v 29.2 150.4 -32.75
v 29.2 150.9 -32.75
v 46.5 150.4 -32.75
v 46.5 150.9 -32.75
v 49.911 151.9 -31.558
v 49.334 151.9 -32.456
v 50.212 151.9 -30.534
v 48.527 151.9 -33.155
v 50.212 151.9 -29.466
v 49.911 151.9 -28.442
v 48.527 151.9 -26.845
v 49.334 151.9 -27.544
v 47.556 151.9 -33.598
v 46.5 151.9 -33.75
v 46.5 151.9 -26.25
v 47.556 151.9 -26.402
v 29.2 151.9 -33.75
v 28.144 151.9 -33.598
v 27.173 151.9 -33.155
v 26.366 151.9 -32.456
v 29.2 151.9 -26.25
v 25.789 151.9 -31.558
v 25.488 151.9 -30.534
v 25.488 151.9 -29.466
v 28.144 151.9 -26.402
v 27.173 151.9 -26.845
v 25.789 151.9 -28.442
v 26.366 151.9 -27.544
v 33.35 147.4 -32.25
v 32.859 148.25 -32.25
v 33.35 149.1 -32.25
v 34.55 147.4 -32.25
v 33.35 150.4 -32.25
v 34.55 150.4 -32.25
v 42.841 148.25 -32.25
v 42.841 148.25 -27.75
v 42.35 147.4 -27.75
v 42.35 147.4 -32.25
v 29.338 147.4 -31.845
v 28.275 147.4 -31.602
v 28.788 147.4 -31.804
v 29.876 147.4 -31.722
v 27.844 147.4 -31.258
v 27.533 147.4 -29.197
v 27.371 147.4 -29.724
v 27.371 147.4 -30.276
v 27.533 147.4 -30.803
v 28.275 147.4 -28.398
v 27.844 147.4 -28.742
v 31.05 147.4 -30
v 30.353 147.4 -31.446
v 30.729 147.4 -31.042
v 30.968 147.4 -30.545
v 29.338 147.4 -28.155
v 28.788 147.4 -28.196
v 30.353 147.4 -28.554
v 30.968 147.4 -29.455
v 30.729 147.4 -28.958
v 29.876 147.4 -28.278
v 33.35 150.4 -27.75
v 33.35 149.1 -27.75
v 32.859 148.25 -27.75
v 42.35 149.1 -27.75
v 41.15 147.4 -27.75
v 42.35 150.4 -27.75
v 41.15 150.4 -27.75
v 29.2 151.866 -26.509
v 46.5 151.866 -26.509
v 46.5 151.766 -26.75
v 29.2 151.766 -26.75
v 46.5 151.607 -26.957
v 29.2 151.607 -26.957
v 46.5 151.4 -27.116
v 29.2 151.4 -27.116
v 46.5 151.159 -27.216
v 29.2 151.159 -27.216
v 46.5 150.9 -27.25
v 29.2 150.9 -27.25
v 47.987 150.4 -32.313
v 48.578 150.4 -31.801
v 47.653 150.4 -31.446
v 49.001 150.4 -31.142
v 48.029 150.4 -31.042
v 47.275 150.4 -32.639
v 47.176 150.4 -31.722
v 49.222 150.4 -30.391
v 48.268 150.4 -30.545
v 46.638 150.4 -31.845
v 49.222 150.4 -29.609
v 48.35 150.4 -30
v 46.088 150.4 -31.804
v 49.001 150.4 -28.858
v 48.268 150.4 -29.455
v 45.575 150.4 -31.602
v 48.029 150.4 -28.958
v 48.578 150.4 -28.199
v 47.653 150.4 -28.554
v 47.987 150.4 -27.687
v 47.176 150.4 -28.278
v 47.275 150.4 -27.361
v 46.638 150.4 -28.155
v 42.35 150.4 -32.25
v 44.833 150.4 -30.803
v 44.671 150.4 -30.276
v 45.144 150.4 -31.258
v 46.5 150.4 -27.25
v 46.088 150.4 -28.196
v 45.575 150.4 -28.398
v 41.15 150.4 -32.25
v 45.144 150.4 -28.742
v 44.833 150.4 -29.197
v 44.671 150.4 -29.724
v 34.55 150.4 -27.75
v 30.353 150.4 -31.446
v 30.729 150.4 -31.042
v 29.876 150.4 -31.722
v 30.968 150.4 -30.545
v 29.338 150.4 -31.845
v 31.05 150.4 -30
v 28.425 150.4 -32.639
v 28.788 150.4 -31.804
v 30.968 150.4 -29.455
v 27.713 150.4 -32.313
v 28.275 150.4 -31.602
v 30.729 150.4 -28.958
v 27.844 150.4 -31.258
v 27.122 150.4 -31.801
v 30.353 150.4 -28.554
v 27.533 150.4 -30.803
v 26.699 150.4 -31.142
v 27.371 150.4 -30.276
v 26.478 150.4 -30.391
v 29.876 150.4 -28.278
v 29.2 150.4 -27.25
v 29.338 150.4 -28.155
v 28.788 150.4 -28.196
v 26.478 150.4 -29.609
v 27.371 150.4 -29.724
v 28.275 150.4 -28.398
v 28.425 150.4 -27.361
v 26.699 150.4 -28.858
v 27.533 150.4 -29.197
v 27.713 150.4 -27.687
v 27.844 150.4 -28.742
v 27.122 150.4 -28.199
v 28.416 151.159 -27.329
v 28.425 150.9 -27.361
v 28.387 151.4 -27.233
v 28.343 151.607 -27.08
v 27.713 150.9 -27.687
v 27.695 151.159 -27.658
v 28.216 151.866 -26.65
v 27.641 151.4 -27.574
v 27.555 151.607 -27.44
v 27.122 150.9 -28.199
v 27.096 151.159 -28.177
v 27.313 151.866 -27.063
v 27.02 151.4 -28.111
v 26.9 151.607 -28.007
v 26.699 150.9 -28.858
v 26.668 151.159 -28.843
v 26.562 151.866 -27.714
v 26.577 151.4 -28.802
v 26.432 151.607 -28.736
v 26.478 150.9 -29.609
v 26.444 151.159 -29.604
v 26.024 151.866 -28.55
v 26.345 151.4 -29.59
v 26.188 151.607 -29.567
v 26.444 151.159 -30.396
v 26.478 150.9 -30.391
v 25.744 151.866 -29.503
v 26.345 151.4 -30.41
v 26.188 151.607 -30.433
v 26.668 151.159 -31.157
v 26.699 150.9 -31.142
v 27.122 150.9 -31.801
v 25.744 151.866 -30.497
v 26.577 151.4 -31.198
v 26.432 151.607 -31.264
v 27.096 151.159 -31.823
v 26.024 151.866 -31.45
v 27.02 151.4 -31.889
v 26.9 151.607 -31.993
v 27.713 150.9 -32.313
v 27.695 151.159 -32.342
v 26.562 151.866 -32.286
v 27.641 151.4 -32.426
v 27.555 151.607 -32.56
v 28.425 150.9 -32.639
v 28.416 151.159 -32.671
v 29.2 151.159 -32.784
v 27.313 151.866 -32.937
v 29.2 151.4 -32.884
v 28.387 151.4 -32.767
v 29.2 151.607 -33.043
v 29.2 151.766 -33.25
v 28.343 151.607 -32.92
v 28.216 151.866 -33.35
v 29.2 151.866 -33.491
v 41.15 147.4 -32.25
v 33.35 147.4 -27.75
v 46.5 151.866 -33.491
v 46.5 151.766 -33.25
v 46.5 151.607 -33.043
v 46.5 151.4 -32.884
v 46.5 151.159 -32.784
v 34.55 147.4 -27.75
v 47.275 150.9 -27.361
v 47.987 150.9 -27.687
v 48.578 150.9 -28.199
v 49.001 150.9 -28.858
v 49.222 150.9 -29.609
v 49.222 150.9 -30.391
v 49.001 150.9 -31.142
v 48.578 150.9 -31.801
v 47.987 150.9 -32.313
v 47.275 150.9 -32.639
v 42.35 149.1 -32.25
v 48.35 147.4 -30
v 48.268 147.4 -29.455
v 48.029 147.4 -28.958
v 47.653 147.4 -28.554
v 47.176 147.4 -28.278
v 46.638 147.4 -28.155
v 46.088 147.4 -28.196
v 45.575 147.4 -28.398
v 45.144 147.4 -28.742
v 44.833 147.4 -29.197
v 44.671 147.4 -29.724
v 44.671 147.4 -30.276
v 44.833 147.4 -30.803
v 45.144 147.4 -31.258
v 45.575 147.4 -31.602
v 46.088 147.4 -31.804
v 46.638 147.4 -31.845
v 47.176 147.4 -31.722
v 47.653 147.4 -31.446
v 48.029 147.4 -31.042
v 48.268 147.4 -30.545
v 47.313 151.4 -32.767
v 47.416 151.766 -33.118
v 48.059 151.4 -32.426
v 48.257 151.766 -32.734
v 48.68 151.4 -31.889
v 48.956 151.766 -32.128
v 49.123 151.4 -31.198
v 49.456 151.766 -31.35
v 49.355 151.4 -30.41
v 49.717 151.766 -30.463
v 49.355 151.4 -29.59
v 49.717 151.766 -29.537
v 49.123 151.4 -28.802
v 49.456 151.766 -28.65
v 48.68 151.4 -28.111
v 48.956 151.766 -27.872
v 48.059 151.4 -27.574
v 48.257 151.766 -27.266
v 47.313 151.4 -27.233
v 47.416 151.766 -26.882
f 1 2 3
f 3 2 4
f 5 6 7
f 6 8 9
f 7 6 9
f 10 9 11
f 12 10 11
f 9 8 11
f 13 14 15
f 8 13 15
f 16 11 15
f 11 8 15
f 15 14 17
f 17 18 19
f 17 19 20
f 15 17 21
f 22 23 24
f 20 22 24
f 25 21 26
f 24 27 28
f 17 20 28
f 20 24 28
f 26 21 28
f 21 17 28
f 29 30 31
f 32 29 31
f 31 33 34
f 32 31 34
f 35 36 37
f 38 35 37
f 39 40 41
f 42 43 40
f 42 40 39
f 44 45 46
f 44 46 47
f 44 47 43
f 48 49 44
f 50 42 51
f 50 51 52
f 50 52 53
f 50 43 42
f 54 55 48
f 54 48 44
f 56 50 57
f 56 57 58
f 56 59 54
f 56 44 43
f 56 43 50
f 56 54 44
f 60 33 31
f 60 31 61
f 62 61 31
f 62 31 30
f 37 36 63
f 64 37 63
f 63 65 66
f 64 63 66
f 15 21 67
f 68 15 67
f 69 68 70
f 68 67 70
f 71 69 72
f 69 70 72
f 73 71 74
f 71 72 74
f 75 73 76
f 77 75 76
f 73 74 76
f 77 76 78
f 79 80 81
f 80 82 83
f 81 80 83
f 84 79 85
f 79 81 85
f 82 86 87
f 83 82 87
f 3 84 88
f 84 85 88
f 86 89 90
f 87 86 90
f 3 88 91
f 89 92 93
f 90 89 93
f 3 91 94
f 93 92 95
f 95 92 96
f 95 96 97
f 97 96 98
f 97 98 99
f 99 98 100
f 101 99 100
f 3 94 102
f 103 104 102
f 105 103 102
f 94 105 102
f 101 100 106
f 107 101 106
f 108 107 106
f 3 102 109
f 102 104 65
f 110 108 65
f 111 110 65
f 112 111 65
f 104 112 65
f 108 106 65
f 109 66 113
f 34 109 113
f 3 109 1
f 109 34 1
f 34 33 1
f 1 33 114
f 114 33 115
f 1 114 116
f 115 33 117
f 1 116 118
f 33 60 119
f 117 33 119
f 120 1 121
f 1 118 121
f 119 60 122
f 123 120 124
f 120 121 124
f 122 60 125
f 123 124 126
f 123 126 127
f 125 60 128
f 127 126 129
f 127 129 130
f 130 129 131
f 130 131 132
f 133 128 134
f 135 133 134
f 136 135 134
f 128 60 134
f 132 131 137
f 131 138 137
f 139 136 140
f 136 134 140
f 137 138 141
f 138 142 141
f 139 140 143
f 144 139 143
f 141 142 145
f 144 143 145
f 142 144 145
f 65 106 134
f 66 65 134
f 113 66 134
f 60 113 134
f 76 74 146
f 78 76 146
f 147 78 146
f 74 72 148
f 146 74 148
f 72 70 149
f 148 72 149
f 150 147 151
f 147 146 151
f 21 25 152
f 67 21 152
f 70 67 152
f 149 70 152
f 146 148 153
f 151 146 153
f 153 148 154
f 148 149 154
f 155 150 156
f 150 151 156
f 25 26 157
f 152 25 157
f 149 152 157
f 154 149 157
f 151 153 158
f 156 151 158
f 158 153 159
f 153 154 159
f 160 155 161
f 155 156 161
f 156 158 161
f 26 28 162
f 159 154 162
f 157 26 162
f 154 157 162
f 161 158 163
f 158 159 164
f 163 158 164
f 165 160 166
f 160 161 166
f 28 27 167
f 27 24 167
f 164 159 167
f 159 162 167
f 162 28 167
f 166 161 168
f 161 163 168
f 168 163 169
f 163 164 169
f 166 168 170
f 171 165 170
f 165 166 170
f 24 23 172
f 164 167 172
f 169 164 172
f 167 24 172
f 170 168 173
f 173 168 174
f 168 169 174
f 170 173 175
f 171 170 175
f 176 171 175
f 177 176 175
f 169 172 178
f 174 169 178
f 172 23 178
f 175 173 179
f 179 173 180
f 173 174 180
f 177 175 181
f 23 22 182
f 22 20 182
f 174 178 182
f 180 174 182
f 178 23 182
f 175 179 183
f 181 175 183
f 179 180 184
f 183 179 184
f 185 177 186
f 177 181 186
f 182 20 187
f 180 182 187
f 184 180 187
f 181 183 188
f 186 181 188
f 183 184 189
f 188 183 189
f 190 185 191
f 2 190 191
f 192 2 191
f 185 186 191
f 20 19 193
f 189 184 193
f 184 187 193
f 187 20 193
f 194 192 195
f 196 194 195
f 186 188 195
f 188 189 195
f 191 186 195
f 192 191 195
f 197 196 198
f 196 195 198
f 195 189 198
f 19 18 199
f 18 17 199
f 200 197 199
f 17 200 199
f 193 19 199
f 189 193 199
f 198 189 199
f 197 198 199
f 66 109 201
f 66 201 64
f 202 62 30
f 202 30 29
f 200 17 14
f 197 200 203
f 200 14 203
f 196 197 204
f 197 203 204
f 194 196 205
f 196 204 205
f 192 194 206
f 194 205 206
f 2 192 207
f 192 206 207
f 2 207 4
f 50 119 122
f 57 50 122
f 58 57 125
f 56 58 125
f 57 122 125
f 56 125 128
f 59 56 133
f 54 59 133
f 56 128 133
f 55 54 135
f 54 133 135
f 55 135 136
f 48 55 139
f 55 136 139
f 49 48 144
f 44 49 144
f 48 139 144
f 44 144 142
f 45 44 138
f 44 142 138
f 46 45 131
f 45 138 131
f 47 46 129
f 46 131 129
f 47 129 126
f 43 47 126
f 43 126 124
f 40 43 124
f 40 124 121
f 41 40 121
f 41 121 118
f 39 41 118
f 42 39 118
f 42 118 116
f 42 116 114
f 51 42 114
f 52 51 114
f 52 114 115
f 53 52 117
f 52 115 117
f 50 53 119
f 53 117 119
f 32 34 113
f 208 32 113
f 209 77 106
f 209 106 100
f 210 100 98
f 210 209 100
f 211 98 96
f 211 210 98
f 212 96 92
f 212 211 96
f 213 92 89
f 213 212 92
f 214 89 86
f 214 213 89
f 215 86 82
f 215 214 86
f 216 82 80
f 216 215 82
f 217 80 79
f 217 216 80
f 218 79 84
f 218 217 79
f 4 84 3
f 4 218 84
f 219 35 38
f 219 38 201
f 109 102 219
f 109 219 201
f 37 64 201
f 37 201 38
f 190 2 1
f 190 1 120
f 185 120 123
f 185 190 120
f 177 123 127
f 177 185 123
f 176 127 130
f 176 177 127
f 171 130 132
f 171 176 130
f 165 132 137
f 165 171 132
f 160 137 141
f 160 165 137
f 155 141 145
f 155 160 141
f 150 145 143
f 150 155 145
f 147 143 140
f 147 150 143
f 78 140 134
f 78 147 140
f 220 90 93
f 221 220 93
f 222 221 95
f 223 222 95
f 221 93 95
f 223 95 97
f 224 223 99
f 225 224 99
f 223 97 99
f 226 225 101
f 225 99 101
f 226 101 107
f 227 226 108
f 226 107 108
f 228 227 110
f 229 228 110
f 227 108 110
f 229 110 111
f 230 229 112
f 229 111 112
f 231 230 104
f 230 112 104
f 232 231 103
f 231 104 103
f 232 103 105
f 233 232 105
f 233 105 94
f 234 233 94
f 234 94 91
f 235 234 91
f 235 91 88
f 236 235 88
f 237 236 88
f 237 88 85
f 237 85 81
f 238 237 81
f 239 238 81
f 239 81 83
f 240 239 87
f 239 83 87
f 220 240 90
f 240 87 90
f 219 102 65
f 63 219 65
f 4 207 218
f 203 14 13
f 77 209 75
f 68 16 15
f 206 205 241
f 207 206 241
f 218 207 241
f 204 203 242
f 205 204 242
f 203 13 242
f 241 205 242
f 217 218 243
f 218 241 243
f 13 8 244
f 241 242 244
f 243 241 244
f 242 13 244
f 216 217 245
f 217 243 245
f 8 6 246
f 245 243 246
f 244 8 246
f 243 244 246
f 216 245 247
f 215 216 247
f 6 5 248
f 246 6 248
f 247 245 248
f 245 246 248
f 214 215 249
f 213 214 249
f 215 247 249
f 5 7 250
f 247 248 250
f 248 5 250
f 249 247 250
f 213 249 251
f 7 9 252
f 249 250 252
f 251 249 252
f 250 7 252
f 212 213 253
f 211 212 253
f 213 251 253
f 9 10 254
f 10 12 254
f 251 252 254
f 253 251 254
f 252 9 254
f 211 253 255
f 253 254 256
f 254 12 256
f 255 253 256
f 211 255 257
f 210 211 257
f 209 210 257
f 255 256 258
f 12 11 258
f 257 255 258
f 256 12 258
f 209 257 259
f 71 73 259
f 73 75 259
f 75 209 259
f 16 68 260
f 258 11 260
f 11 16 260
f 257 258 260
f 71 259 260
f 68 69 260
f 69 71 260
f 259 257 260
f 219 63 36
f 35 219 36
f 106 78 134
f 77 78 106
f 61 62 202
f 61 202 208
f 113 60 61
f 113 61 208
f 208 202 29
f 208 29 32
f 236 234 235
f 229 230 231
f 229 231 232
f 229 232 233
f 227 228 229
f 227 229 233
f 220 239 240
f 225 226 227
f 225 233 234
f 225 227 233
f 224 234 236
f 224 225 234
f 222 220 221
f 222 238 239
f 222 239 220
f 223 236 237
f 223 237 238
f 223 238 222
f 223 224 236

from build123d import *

# Parameters (mm, degrees)
SKETCH017_R      = 1.85
SKETCH017_W      = 1.2
SKETCH017_H      = 4.5
EXTRUDE022_DEPTH = 3
EXTRUDE023_DEPTH = 4.5
EXTRUDE021_DEPTH = 1.5


with BuildPart() as extrude022:
    # Sketch017 (on Face5 of Extrude021) → Extrude022 (new body)
    with BuildSketch(Plane.XZ.offset(-150.4)):
        with Locations((29.2, -30)):
            Circle(SKETCH017_R)
        with Locations((46.5, -30)):
            Circle(SKETCH017_R)
        with Locations((33.95, -30)):
            Rectangle(SKETCH017_W, SKETCH017_H)
        with Locations((41.75, -30)):
            Rectangle(SKETCH017_W, SKETCH017_H)
    extrude(amount=EXTRUDE022_DEPTH)


with BuildPart() as extrude023:
    # Sketch018 (on Face8 of Extrude022) → Extrude023 (new body)
    with BuildSketch(Plane.XY.offset(-27.75)):
        Polygon((33.35, 147.4), (33.35, 149.1), (32.859252, 148.25), align=None)
        Polygon((42.35, 147.4), (42.35, 149.1), (42.840748, 148.25), align=None)
    extrude(amount=-EXTRUDE023_DEPTH)


with BuildPart() as sweep_body:
    # Sweep: sweep along a path in Sketch020
    with BuildLine(Plane.XZ.offset(-150.4)) as sweep_path:
        Line((46.5, -27.25), (29.2, -27.25))
        ThreePointArc((29.200001, -27.25), (26.45, -30), (29.2, -32.75))
        Line((29.2, -32.75), (46.5, -32.75))
        ThreePointArc((46.5, -32.75), (49.25, -29.999999), (46.499999, -27.25))
    # Sketch019 (on Vertex5 of Extrude021) → Sweep (sweep)
    with BuildSketch(Plane(origin=(46.5, 150.4, -27.25), x_dir=(0, 1, 0), z_dir=(1, 0, 0))):
        with BuildLine():
            Line((0.5, 0), (1.5, 0))
            Line((1.5, 0), (1.5, 1))
            ThreePointArc((0.5, 0), (1.207107, 0.292893), (1.5, 1))
        make_face()
    sweep(path=sweep_path.line, is_frenet=True)


with BuildPart() as usb_cover:
    # Sketch016 (on Face14 of Fusion014) → Extrude021 (new body)
    with BuildSketch(Plane(origin=(68, 151.9, 0), x_dir=(-1, 0, 0), z_dir=(0, 1, 0))):
        with BuildLine():
            Line((38.8, -27.25), (21.5, -27.25))
            ThreePointArc((21.5, -27.25), (18.75, -30), (21.5, -32.75))
            Line((38.8, -32.75), (21.5, -32.75))
            ThreePointArc((38.8, -32.75), (41.55, -30), (38.8, -27.25))
        make_face()
    extrude(amount=-EXTRUDE021_DEPTH)

    # Fusion071: union Extrude022, Extrude023, Sweep body
    add(extrude022.part)
    add(extrude023.part)
    add(sweep_body.part)


solid = usb_cover.part
